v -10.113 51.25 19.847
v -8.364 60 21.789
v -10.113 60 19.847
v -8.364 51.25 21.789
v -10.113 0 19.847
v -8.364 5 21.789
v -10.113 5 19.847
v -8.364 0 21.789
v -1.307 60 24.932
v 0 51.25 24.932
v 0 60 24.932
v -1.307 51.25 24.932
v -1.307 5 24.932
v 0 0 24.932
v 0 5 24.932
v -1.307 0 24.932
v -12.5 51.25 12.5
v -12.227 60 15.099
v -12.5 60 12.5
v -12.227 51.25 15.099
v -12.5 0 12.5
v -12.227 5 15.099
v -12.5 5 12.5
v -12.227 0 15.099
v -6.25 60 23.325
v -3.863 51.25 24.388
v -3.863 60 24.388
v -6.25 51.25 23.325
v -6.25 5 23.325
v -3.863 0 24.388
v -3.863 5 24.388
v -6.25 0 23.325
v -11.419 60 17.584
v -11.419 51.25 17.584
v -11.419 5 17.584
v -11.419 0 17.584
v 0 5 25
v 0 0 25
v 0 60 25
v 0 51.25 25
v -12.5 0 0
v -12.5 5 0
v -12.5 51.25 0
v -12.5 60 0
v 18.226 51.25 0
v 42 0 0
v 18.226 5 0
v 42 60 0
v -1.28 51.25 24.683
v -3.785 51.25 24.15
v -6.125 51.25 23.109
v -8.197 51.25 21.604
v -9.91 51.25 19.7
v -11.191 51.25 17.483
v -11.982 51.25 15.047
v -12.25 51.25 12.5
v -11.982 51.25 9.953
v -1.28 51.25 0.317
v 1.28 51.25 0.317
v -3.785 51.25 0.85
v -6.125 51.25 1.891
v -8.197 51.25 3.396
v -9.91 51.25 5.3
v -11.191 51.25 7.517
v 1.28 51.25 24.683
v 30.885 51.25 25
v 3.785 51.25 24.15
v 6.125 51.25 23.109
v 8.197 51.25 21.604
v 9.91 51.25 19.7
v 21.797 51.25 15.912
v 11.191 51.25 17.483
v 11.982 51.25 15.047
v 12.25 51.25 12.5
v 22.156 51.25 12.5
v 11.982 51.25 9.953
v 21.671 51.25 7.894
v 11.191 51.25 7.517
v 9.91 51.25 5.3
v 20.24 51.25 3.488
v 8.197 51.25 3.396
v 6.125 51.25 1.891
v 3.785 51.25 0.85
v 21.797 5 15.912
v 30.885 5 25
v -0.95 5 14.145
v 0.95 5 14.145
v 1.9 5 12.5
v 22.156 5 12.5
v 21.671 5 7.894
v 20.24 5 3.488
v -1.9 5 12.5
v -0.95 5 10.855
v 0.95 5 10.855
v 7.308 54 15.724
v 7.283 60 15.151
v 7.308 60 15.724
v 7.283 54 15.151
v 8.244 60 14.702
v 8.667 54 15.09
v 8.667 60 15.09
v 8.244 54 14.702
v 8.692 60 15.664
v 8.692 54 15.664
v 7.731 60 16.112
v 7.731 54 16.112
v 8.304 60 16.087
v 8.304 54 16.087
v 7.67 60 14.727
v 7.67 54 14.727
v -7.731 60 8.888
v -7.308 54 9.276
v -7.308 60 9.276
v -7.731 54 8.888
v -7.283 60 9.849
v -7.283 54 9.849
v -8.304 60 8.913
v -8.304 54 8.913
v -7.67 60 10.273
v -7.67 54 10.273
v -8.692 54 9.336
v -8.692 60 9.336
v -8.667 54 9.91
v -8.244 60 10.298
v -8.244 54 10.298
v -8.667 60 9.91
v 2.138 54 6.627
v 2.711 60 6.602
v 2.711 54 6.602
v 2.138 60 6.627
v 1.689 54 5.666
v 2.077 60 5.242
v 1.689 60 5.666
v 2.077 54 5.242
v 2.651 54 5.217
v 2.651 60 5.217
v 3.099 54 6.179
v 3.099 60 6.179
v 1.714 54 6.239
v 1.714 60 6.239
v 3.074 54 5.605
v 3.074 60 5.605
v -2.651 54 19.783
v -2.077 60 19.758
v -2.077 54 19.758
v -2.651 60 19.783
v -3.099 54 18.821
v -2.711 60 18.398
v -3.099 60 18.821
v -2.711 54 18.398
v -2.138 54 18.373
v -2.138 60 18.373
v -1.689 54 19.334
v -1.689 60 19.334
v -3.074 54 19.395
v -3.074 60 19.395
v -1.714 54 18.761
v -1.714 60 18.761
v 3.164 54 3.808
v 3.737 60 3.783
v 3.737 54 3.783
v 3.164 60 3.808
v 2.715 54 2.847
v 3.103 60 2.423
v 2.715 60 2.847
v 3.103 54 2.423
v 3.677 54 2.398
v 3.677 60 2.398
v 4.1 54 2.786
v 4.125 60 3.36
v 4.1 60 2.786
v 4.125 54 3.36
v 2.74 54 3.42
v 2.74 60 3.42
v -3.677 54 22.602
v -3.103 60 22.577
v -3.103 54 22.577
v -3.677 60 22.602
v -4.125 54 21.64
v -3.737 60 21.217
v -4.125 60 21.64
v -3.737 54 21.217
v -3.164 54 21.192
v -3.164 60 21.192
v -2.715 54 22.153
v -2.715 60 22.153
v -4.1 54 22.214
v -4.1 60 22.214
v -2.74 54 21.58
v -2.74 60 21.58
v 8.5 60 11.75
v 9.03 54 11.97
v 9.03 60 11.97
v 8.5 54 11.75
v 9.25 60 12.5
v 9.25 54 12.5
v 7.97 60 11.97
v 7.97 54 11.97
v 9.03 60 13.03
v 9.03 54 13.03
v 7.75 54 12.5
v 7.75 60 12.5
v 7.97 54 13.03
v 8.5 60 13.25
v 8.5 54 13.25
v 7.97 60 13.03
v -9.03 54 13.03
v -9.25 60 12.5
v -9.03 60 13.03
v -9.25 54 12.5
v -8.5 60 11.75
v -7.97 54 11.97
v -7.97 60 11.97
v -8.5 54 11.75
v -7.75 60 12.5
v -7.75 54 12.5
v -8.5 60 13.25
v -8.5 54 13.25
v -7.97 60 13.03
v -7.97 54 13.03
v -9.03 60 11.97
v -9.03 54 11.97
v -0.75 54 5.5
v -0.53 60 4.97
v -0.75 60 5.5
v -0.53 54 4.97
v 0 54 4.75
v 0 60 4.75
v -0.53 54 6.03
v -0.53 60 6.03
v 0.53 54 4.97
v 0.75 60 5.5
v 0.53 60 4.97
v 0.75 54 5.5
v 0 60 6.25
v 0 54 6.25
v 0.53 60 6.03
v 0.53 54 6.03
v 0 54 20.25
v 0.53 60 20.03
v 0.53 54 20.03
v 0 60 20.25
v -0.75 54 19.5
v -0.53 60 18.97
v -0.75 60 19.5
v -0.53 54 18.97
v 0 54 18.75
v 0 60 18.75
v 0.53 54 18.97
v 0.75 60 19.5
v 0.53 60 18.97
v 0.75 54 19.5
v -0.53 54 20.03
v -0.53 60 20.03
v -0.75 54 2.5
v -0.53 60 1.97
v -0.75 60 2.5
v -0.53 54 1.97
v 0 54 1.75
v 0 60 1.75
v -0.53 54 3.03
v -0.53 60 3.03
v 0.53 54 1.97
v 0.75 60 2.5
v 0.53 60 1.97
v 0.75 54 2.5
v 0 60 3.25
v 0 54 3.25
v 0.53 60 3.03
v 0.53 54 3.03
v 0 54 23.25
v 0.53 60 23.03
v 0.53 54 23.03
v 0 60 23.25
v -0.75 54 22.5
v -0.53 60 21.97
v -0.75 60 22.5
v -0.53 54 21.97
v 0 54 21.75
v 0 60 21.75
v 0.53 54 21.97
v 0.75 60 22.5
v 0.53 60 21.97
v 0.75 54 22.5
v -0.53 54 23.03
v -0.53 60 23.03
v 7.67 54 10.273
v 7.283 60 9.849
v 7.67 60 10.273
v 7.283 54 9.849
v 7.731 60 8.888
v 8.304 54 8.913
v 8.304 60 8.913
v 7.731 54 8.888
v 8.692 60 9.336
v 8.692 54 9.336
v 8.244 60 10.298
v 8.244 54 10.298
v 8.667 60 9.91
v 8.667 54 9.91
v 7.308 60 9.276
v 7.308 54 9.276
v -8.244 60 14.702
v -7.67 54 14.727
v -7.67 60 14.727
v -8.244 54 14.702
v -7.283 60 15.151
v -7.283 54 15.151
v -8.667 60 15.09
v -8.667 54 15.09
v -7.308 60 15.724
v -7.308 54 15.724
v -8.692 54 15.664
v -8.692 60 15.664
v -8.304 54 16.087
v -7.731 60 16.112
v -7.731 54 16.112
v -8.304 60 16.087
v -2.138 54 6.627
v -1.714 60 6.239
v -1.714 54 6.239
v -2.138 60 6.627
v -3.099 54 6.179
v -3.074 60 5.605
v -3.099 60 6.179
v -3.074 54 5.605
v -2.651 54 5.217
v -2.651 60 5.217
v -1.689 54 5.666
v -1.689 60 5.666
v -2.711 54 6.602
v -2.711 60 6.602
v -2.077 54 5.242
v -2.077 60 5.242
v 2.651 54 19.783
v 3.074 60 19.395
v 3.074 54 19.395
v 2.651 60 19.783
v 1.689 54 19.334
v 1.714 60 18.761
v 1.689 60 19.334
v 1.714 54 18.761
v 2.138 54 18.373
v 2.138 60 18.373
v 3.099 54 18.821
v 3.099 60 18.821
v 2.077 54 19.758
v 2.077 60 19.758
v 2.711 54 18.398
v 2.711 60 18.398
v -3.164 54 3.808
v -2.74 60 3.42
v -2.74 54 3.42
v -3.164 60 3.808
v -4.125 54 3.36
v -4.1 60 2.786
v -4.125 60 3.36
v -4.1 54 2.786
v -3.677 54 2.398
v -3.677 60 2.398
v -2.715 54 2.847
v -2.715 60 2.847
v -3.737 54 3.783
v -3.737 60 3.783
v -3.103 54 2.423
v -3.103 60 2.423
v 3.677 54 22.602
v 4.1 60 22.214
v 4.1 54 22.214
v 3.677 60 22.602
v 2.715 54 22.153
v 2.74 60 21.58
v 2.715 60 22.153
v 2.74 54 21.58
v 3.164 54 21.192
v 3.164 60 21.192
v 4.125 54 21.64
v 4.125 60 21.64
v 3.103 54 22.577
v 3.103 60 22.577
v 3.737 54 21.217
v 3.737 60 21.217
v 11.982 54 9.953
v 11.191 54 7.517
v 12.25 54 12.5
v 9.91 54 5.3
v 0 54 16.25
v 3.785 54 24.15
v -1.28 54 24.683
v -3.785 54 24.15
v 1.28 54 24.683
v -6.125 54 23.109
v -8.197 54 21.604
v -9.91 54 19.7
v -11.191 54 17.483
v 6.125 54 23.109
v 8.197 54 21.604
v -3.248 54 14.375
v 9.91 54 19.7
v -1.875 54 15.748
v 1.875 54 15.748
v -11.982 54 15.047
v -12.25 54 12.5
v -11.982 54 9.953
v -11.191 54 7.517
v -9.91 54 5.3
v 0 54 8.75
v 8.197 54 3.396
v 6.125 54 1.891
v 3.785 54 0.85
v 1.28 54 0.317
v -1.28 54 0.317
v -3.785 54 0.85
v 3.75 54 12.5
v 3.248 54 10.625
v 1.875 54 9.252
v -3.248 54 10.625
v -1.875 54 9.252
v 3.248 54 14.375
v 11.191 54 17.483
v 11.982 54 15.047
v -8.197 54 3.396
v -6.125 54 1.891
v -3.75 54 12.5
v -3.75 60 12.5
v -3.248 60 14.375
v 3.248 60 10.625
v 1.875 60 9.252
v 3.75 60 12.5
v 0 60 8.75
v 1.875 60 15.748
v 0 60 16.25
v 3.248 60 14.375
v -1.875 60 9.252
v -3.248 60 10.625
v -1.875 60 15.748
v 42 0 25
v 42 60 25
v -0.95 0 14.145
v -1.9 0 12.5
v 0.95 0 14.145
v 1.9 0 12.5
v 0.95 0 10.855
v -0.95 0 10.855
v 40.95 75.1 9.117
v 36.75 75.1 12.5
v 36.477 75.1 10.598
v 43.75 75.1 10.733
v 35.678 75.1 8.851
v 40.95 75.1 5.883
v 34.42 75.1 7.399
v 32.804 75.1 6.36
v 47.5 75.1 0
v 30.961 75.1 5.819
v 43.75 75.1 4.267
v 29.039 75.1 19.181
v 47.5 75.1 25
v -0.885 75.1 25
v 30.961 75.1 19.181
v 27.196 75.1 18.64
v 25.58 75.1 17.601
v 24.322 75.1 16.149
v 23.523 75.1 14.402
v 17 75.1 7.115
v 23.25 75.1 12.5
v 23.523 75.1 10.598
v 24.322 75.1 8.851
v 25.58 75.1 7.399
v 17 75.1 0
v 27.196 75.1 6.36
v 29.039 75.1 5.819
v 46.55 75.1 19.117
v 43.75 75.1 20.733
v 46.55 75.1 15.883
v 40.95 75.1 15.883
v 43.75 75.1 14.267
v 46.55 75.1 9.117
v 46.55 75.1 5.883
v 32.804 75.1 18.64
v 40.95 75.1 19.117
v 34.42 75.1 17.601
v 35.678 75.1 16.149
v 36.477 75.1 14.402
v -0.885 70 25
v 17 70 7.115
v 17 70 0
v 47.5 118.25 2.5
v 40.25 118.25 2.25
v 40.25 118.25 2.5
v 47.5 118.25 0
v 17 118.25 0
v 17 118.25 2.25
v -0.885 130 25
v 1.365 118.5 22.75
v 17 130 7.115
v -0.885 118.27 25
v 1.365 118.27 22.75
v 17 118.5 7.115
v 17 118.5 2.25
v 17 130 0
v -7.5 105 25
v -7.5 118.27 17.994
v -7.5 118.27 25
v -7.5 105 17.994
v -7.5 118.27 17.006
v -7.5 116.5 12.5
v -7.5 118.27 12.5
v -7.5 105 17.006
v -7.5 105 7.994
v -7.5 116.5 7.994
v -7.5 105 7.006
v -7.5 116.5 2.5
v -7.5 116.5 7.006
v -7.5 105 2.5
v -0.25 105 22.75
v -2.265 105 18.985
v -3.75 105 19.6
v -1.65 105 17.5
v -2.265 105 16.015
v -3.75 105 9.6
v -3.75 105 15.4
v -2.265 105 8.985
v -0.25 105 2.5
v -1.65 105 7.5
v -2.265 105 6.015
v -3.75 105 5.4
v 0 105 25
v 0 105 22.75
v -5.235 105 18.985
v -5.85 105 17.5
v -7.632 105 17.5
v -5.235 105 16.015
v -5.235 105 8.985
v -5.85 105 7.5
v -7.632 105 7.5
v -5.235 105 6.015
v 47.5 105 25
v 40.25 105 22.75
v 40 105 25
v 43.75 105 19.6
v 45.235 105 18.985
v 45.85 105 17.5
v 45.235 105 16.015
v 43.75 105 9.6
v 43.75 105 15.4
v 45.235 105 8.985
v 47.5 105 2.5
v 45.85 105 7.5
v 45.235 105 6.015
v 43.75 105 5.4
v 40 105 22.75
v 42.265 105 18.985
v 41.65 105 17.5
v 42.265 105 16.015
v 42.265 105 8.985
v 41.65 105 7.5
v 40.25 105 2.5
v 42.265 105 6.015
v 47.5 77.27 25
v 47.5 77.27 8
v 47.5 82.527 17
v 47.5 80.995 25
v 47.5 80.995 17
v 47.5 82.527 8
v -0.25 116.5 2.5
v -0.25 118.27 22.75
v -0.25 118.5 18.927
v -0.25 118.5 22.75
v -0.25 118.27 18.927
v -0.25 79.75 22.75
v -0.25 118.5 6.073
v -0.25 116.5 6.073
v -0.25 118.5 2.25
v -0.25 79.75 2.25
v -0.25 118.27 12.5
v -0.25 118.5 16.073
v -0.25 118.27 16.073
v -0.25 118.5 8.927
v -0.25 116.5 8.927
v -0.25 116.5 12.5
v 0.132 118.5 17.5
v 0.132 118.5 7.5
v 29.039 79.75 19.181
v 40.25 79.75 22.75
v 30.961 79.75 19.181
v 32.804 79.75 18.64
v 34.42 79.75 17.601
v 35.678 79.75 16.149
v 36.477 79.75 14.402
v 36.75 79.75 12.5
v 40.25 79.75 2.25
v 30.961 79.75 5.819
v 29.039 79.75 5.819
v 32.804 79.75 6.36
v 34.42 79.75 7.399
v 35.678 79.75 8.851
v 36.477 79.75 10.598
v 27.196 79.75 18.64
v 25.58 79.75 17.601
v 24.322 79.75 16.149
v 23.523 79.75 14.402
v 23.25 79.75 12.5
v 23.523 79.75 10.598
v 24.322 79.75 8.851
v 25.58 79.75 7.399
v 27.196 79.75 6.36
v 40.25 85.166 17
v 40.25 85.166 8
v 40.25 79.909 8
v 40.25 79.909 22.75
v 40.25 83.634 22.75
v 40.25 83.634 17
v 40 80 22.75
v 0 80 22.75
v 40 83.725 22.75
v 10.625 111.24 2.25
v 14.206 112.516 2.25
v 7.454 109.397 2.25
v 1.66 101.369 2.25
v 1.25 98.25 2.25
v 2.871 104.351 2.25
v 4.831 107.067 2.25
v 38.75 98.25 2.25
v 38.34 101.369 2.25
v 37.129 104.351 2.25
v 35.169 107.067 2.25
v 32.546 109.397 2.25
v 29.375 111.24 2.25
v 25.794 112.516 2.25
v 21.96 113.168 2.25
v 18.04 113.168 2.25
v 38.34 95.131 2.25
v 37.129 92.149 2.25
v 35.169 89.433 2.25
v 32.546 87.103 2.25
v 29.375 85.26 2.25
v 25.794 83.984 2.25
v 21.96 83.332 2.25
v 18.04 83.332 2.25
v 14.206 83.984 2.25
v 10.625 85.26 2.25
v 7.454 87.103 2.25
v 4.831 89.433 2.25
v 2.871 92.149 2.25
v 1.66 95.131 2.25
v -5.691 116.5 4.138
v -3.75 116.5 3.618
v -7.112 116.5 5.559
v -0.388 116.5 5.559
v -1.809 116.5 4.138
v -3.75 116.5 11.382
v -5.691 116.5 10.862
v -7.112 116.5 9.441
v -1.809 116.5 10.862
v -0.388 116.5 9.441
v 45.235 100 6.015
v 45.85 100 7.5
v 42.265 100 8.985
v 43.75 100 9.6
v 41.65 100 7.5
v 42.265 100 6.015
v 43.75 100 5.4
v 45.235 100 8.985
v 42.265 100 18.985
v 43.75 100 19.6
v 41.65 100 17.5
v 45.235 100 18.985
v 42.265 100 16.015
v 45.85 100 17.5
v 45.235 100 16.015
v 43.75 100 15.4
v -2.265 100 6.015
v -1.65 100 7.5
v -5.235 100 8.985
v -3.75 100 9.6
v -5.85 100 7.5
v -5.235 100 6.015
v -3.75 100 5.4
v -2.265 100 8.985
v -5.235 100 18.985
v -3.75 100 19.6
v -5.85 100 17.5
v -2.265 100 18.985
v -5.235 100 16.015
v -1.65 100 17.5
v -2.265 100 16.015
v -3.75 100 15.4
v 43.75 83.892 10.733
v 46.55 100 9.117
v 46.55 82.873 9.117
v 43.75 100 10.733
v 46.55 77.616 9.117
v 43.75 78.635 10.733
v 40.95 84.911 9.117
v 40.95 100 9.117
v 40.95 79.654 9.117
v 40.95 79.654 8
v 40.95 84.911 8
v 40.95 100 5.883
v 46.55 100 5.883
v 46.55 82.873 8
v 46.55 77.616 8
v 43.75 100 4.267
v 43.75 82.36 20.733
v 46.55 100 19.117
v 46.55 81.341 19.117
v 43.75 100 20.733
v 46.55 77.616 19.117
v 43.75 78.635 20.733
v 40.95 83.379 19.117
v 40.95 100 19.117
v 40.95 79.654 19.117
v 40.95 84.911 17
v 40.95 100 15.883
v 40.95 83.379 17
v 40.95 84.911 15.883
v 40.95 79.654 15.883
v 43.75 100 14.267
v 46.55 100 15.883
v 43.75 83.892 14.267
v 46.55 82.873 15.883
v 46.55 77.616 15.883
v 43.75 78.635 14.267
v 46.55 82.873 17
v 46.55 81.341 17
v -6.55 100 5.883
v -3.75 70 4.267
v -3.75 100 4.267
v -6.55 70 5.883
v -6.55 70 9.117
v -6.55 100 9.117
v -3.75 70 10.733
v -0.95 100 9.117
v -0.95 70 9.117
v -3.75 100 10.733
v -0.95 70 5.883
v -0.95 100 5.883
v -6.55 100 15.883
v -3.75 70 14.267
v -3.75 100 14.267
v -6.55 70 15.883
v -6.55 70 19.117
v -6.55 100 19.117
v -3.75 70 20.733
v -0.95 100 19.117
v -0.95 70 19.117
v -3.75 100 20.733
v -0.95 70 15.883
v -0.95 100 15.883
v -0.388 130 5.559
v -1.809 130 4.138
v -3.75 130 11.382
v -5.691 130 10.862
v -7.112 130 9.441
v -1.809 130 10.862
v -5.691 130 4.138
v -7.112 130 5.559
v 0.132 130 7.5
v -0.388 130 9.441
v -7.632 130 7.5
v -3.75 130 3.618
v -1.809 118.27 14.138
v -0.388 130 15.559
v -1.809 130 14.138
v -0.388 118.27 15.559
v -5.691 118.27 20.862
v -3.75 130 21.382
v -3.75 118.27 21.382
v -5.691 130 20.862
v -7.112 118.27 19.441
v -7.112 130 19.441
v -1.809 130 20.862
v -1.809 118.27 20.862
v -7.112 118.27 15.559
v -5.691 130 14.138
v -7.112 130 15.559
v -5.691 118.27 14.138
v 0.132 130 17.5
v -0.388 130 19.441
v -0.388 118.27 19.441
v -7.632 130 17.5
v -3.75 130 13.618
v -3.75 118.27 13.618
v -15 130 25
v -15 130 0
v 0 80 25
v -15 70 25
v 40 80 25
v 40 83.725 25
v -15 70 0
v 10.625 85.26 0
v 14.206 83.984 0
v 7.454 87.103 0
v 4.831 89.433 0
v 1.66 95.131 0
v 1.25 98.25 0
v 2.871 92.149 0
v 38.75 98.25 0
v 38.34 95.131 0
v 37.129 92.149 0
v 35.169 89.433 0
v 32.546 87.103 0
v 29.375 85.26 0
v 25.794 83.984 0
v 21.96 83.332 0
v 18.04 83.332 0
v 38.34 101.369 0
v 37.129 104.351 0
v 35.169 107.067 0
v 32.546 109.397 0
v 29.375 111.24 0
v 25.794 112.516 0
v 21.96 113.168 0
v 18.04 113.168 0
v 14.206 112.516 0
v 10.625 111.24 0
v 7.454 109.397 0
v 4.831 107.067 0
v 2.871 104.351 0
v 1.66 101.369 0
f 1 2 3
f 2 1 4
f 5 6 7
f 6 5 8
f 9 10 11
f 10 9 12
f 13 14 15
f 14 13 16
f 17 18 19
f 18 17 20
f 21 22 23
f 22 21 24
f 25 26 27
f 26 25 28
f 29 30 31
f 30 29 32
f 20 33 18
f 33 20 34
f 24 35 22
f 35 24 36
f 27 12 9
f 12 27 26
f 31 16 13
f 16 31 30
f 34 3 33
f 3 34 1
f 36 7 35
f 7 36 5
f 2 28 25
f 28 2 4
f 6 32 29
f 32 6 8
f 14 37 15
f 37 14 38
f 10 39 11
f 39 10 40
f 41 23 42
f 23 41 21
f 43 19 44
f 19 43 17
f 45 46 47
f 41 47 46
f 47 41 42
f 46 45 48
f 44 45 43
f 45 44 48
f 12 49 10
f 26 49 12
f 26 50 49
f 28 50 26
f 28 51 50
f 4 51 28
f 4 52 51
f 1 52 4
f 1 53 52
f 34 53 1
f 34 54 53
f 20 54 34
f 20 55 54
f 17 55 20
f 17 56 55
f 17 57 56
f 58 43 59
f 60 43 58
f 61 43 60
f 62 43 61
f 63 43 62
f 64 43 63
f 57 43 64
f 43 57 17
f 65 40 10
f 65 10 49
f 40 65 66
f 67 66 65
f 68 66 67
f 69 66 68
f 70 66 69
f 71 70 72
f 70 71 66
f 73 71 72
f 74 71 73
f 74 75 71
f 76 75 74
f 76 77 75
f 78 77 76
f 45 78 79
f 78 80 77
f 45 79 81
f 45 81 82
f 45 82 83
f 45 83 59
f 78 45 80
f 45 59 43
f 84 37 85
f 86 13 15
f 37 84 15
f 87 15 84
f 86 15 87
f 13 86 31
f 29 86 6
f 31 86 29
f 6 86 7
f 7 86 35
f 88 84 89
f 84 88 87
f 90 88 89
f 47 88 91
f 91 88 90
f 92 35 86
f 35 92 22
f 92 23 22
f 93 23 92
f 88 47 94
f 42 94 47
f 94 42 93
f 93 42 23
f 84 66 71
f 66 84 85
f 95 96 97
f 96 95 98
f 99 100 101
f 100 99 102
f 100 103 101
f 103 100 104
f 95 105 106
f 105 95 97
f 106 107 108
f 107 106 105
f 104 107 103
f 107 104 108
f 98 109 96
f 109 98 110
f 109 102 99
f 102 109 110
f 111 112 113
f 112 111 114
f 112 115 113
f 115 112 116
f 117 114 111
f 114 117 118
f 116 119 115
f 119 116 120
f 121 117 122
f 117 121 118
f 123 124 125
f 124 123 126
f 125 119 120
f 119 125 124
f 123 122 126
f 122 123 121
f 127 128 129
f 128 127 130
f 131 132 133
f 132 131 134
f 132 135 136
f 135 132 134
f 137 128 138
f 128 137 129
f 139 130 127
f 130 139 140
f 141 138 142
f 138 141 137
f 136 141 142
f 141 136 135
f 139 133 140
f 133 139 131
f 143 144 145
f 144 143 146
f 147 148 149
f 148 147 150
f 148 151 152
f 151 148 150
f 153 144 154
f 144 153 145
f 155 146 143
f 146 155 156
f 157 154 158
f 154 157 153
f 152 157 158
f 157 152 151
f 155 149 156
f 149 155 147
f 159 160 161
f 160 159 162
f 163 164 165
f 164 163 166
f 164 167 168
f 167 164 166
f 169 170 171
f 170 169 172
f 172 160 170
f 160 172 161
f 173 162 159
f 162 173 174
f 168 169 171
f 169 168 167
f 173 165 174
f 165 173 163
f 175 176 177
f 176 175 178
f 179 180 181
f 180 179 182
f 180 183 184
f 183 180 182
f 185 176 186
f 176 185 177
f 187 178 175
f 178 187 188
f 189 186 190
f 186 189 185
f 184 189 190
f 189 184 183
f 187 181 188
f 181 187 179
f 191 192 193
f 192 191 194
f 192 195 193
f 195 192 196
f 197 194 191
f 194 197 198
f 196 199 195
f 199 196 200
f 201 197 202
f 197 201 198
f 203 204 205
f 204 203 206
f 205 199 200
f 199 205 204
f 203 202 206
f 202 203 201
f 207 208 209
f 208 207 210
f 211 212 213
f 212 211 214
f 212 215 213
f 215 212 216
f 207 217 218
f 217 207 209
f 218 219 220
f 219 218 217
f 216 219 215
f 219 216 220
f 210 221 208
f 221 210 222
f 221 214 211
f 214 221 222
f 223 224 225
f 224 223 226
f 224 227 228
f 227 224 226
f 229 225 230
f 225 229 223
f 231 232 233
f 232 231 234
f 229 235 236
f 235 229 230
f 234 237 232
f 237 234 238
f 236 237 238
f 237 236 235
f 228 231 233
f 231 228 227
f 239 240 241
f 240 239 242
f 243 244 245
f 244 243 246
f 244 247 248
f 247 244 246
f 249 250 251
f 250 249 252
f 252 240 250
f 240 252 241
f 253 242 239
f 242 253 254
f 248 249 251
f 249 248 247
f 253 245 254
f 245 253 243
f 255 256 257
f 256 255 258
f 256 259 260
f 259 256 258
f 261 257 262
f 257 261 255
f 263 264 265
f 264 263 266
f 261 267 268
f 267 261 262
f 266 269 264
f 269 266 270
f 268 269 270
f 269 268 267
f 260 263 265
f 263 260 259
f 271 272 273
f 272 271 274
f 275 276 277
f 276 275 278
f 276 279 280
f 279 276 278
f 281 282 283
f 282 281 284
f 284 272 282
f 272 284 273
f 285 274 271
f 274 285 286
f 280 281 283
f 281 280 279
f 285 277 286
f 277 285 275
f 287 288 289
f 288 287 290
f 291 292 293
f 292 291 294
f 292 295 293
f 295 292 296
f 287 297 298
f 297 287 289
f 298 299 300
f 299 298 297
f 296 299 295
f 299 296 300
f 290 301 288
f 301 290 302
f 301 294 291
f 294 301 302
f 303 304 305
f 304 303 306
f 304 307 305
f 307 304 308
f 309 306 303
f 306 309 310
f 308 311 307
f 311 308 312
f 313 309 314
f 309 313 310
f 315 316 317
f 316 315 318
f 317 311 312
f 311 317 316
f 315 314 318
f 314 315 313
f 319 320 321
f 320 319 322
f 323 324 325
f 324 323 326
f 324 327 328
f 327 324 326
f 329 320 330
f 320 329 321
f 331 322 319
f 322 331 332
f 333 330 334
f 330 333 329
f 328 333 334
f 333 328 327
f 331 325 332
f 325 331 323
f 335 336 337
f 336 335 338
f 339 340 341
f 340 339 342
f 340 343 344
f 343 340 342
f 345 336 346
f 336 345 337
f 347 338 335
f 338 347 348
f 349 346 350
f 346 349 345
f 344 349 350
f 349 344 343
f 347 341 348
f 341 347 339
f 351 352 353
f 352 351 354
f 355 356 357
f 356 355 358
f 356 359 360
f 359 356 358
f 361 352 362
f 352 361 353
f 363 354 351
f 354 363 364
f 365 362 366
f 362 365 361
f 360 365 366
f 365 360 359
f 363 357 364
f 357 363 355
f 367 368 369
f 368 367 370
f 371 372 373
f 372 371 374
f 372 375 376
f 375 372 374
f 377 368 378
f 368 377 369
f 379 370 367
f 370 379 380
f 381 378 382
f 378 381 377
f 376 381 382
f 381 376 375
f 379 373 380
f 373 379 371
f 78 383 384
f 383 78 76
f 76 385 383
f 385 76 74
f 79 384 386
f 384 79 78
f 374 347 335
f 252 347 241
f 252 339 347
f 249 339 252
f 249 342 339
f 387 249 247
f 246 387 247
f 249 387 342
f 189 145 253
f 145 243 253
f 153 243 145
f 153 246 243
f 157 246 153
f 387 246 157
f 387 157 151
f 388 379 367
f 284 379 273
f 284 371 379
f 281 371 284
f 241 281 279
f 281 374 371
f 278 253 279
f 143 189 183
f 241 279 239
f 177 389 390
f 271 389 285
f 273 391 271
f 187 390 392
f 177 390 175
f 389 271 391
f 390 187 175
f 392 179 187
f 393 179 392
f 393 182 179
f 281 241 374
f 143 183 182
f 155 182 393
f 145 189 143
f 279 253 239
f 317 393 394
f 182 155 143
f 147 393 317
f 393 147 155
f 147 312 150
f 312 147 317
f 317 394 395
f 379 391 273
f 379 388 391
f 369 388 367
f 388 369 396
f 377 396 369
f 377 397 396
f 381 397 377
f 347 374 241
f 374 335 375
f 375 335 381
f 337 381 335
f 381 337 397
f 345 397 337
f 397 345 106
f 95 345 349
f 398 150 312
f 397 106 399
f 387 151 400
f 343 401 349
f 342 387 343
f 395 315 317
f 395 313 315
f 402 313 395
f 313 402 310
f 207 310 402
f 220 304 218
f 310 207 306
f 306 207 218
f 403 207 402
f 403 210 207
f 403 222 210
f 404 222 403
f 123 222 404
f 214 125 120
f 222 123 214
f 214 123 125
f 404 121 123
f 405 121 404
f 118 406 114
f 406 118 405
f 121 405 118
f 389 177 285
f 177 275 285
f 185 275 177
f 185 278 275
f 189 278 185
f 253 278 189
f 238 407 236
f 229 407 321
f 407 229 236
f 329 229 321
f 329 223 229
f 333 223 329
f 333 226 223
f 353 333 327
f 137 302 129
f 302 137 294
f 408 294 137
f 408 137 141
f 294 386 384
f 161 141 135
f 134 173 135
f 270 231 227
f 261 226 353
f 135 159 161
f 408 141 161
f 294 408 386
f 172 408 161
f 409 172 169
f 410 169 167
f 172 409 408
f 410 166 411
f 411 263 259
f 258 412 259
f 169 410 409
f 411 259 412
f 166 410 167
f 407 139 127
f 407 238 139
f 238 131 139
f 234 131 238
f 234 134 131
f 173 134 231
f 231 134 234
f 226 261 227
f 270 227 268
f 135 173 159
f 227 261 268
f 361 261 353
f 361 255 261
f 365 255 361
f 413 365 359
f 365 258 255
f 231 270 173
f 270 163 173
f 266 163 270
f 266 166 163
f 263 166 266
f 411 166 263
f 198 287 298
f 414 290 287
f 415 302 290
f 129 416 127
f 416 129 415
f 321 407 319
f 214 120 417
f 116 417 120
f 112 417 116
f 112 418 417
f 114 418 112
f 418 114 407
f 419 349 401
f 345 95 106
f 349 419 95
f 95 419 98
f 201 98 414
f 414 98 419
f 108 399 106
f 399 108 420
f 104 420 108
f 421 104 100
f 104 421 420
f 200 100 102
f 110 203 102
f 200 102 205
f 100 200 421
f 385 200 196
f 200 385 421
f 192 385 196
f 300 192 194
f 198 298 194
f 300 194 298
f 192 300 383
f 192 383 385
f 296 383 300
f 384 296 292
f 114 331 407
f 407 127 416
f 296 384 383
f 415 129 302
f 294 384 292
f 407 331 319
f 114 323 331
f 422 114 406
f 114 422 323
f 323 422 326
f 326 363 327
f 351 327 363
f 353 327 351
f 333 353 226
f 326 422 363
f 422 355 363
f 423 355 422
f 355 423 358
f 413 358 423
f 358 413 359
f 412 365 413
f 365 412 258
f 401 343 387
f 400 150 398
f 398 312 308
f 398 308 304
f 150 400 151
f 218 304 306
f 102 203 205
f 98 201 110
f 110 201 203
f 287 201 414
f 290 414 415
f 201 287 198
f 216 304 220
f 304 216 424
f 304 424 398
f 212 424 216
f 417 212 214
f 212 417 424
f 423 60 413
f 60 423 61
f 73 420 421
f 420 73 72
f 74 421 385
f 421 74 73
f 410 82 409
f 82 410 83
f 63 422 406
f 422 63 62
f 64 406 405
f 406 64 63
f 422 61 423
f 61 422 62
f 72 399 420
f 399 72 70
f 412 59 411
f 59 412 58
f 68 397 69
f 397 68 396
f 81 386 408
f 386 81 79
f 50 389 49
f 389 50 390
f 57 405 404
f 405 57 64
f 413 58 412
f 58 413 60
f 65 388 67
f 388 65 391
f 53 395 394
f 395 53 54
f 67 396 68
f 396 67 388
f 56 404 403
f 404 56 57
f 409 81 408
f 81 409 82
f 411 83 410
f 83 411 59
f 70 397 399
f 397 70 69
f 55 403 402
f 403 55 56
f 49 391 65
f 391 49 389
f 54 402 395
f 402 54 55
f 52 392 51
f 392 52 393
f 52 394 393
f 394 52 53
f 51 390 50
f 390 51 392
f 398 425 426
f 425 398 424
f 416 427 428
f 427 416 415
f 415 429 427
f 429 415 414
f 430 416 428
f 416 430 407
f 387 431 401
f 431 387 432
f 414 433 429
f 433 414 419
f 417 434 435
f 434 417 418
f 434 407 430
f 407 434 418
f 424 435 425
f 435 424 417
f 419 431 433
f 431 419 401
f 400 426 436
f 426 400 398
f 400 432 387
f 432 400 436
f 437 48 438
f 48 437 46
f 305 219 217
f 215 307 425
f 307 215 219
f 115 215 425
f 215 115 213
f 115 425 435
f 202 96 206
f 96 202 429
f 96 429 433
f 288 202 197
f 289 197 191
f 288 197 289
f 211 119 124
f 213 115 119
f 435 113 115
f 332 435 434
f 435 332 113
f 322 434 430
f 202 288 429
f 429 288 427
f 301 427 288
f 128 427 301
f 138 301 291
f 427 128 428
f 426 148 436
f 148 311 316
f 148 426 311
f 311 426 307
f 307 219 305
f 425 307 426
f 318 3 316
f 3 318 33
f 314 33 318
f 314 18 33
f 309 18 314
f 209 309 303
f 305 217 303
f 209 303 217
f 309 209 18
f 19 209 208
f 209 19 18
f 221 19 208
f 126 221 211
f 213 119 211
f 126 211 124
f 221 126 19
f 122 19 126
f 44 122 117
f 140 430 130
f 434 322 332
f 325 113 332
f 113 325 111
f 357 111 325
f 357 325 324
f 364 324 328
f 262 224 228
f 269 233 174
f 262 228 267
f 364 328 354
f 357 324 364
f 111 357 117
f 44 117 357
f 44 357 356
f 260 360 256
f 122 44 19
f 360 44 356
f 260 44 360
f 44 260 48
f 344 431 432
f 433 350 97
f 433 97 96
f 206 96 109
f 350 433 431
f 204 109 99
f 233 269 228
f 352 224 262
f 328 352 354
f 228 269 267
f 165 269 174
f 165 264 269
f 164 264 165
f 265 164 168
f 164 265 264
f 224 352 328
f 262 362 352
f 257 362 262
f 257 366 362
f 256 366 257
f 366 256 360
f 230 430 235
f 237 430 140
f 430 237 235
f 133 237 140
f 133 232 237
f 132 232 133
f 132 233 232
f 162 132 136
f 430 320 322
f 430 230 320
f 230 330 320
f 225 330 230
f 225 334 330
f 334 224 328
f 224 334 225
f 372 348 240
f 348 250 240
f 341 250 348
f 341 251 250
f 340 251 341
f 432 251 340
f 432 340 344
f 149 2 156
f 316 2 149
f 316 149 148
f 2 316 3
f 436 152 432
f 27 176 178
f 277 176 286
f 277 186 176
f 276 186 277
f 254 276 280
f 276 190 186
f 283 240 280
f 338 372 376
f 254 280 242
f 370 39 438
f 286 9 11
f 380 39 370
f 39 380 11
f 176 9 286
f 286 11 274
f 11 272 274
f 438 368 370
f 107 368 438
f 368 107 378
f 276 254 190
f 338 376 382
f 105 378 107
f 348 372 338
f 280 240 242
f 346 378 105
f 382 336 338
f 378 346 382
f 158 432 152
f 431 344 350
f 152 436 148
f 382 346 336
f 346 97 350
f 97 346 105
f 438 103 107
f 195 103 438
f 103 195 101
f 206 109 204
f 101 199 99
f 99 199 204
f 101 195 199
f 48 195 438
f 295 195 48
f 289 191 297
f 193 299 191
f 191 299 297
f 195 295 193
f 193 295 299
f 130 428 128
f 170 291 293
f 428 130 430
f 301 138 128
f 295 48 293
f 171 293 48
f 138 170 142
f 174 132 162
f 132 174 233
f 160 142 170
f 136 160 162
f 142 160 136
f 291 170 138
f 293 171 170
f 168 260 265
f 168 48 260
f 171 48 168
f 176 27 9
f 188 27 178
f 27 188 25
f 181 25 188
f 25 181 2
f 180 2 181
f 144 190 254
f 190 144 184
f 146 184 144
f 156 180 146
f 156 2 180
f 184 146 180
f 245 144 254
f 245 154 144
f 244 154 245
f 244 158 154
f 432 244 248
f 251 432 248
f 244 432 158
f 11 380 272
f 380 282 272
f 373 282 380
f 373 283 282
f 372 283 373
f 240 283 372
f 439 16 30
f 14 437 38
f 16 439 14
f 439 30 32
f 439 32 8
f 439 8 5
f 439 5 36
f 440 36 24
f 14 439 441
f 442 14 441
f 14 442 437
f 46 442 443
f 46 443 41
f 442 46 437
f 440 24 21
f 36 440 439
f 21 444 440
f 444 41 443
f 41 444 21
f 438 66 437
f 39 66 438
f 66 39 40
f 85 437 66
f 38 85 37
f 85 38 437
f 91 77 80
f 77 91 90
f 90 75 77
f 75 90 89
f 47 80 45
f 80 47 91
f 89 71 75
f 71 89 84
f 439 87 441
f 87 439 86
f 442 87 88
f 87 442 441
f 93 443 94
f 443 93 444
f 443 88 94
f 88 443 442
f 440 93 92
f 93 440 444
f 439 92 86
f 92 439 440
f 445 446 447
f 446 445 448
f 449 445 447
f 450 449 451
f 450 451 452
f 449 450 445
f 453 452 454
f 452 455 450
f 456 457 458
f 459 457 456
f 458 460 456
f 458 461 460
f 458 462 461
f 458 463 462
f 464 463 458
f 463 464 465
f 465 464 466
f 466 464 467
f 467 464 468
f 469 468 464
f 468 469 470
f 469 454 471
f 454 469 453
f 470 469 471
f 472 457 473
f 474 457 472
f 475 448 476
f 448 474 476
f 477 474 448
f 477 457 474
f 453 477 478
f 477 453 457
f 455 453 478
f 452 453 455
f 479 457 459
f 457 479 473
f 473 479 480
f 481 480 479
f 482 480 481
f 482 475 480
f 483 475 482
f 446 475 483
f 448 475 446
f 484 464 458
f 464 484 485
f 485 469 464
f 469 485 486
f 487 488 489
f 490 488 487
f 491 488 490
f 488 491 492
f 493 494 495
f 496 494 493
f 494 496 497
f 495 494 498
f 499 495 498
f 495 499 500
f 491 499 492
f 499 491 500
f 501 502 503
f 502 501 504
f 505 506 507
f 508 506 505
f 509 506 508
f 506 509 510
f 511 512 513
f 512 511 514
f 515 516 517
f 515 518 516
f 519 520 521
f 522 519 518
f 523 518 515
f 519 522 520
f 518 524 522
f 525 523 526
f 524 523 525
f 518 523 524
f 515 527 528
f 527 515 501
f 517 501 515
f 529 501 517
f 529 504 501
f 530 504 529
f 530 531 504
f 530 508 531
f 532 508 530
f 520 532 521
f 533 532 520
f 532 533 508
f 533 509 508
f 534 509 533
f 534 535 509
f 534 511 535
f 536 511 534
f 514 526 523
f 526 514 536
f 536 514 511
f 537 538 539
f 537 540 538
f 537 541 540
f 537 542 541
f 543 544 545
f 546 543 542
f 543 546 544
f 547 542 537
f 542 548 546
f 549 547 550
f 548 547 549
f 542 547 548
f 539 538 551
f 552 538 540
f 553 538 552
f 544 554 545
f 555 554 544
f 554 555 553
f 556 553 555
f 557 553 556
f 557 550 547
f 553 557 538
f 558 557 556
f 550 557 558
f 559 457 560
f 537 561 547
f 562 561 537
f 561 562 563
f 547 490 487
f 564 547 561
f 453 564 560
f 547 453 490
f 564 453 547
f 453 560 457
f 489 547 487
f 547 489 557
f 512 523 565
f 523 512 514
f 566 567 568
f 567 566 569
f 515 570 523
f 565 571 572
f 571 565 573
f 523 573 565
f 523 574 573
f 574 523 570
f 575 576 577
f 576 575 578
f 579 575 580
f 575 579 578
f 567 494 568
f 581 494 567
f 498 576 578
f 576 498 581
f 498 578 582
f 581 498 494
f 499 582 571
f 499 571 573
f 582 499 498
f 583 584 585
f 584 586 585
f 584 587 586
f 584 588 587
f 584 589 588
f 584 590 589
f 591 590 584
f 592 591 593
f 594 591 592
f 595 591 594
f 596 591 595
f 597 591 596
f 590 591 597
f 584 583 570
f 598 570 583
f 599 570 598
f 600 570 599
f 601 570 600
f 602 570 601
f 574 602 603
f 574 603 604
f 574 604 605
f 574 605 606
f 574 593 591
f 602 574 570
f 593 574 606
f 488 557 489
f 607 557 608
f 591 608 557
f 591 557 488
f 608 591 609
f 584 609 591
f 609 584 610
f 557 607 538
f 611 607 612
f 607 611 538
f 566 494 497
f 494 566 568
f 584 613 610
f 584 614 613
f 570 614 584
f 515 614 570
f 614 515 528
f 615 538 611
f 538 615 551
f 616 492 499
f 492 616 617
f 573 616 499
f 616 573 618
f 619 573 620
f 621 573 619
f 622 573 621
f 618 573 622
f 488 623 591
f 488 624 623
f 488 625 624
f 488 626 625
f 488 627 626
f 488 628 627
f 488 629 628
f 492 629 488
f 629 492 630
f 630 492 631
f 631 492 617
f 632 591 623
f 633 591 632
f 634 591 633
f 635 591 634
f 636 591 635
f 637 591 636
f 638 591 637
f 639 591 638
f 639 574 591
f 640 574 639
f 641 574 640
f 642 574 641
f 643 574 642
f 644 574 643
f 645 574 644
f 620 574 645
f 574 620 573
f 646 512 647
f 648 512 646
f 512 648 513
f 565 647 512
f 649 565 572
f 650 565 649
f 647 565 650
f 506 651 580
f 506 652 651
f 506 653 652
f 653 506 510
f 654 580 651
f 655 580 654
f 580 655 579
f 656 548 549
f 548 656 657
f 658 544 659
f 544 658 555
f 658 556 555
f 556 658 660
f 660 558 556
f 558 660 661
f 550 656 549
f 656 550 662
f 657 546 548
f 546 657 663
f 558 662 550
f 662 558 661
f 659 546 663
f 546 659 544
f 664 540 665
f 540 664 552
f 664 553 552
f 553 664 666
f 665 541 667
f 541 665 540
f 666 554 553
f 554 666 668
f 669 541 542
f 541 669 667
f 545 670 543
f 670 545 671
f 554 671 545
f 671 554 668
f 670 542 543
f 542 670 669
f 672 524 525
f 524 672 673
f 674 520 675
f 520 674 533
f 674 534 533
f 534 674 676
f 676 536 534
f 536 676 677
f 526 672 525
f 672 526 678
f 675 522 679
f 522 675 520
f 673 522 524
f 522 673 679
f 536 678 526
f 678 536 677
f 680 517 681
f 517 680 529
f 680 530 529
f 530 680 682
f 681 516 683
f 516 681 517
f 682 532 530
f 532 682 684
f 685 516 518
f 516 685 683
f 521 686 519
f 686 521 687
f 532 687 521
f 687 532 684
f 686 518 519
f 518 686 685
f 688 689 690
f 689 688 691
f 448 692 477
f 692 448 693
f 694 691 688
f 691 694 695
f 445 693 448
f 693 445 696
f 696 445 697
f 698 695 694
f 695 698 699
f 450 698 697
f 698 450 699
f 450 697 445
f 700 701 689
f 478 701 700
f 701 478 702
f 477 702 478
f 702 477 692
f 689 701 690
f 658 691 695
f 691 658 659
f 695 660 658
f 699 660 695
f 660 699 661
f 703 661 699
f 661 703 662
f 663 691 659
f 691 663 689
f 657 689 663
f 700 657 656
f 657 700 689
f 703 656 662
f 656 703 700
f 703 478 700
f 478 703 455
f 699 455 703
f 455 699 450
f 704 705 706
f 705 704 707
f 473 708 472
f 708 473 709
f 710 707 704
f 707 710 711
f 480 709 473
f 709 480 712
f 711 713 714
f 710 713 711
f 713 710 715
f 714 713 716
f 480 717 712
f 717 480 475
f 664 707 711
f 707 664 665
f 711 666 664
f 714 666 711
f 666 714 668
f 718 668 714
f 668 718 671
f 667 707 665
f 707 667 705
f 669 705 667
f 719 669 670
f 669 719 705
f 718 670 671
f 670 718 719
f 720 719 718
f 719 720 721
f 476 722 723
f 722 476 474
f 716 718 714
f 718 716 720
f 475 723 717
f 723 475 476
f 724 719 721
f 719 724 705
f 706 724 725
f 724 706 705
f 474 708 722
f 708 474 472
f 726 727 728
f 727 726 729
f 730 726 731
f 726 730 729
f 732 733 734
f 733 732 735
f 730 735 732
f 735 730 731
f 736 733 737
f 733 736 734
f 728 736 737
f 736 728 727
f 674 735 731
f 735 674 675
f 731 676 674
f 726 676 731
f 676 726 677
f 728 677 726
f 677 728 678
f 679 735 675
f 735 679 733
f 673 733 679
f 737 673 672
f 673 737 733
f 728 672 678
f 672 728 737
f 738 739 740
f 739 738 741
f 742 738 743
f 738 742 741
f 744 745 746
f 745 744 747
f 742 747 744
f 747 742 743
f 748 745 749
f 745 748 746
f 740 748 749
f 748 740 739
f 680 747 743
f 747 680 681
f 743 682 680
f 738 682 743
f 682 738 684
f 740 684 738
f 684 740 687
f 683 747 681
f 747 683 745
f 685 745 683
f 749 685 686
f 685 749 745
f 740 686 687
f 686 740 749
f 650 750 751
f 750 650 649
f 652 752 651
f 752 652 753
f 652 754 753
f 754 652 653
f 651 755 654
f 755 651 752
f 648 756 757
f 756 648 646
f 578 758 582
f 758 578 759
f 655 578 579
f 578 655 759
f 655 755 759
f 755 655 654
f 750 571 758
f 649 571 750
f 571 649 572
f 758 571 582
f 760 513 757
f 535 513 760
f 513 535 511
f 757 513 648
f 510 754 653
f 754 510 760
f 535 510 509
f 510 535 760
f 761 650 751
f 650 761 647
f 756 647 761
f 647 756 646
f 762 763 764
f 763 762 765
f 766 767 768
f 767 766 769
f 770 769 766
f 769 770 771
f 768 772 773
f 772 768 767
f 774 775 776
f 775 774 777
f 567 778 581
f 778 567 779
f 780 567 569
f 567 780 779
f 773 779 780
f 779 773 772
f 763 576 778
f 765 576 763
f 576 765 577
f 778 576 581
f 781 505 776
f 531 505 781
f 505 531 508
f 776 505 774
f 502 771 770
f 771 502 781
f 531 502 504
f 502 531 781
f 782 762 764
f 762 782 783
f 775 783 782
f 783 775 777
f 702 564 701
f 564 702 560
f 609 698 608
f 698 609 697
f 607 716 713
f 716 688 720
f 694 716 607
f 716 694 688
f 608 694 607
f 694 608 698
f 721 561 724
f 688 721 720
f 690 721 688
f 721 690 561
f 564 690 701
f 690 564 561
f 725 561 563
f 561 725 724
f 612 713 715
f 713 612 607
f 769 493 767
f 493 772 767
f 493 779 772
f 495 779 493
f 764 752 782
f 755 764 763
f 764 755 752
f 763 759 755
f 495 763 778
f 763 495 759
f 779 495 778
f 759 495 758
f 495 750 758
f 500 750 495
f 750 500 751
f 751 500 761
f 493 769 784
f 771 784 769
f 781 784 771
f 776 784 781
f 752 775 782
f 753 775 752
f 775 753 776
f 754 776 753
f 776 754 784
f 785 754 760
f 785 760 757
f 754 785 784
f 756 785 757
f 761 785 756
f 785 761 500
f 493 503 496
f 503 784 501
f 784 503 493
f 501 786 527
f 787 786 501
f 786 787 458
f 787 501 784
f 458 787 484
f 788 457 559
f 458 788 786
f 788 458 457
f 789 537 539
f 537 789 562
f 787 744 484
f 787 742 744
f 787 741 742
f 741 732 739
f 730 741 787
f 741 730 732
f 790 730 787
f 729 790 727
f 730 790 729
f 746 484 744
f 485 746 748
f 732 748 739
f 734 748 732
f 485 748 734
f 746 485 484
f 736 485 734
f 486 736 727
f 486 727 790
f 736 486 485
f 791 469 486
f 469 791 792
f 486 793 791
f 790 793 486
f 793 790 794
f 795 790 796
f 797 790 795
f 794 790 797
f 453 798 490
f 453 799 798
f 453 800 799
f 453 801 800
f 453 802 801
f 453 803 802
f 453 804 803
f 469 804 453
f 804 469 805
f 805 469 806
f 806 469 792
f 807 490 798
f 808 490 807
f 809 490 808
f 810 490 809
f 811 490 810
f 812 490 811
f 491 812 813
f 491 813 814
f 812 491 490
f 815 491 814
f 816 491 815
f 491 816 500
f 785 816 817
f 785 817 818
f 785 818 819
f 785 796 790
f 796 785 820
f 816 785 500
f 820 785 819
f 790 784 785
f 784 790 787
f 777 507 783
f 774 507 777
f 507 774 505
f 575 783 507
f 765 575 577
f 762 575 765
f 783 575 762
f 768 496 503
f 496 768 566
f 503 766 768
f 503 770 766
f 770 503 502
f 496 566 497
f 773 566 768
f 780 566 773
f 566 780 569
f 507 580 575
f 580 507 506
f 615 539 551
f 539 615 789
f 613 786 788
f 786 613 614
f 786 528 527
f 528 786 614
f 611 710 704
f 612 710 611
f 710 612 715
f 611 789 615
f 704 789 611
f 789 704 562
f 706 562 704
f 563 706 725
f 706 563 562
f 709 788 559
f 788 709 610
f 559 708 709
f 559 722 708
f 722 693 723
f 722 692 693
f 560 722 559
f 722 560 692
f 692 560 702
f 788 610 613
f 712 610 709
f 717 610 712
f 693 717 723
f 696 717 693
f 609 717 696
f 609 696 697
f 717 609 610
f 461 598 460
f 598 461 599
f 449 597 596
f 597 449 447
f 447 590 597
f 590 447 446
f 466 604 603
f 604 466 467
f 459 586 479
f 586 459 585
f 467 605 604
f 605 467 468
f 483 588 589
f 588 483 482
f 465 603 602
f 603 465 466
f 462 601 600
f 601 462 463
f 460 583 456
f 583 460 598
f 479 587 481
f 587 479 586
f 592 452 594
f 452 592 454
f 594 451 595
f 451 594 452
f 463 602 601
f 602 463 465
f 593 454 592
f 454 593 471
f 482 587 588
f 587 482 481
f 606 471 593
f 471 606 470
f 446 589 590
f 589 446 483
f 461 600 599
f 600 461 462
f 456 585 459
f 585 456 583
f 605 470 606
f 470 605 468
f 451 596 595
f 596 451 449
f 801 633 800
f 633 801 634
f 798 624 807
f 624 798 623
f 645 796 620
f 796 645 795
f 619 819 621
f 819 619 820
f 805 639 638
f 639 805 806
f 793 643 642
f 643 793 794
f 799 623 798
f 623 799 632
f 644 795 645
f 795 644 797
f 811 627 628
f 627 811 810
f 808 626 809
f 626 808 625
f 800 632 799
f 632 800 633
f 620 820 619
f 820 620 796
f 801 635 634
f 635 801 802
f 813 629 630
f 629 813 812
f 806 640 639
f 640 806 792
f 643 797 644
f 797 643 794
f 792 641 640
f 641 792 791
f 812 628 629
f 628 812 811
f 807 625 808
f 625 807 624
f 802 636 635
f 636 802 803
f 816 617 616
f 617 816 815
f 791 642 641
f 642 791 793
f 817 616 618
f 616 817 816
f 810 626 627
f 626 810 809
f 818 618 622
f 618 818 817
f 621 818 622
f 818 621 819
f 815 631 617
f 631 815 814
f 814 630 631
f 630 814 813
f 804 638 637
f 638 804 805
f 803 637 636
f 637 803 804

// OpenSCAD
// file: servo.scad
A = 20;
B = 15 - 1.25;
C = 35 - 1.25;
D = 10;
E = 10;
F = 30;
G = 13.25;
H = 25;
I = 6.5; // height of mounting wings
J = 55;
K = 11.5;
L = 4.2;
M = 40;
Q = 44 -  G - H;
X = 3;

echo("H + K = ", H + K);
echo("H + G = ", H + G);
echo("Q = ", Q);

M3_nut_radius = 5.6 / cos(180 / 6) / 2;
M3_washer_radius = 7.5 / 2 / cos(180 / 12);

servo_diag1 = sqrt(pow((J  - M) / 2 + E, 2) + pow(A / 2, 2));
servo_diag2 = sqrt(pow((J  - M) / 2 + F, 2) + pow(A / 2, 2));

negative_clearance = 0.25;

module servo() {
	render() {
		translate([-E, -A / 2, 0]) cube([M, A, H + K]);
		difference() {
			translate([-E - (J - M) / 2, A / -2, H]) cube([J, A, I]);
			translate([-B, -D / 2, H - 1]) cylinder(r=L / 2, h = I +2, $fn=8);
			translate([-B, D / 2, H - 1]) cylinder(r=L / 2, h = I + 2, $fn=8);
			translate([C, -D / 2, H - 1]) cylinder(r=L / 2, h = I + 2, $fn=8);
			translate([C, D / 2, H - 1]) cylinder(r=L / 2, h = I + 2, $fn=8);
		}
		translate([0, 0, H]) cylinder(r = A / 2.5, h=G);
		translate([0, 0, H + K]) cylinder(r = 5 / 2, h=X + (G - K), $fn=16);
	}
}

module servo_negative() {
	render() {
		servo();
		translate([-E - negative_clearance, -A / 2 - negative_clearance, -negative_clearance]) cube([M + negative_clearance * 2, A + negative_clearance * 2, H + G + negative_clearance * 2]);
		translate([0, 0, H]) cylinder(r = A / 2.5 + negative_clearance, h=G + negative_clearance);
	
		translate([-E - (J - M) / 2, A / -2, H]) cube([J, A, K]);
	
		translate([-B, -D / 2, H - 10]) cylinder(r=L / 2, h = 12, $fn=8);
		translate([-B, D / 2, H - 10]) cylinder(r=L / 2, h = 12, $fn=8);
		translate([C, -D / 2, H - 10]) cylinder(r=L / 2, h = 12, $fn=8);
		translate([C, D / 2, H - 10]) cylinder(r=L / 2, h = 12, $fn=8);
		translate([-B, -D / 2, -50]) rotate([0, 0, 180 / 6]) cylinder(r=M3_nut_radius, h = H + 45, $fn=6);
		translate([-B, D / 2, -50]) rotate([0, 0, 180 / 6]) cylinder(r=M3_nut_radius, h = H + 45, $fn=6);
		translate([C, -D / 2, -50]) rotate([0, 0, 180 / 6]) cylinder(r=M3_nut_radius, h = H +45, $fn=6);
		translate([C, D / 2, -50]) rotate([0, 0, 180 / 6]) cylinder(r=M3_nut_radius, h = H + 45, $fn=6);
		translate([-B, -D / 2, H]) rotate([0, 0, 180 / 6]) cylinder(r=M3_washer_radius, h = H + 5, $fn=12);
		translate([-B, D / 2, H]) rotate([0, 0, 180 / 6]) cylinder(r=M3_washer_radius, h = H + 5, $fn=12);
		translate([C, -D / 2, H]) rotate([0, 0, 180 / 6]) cylinder(r=M3_washer_radius, h = H + 5, $fn=12);
		translate([C, D / 2, H]) rotate([0, 0, 180 / 6]) cylinder(r=M3_washer_radius, h = H + 5, $fn=12);
	
		translate([0, 0, H]) rotate([0, 0, 180 / 6]) cylinder(r=M3_nut_radius, h = H + 5, $fn=6);
	
		translate([-E, 0, 1])rotate([0, 20, 180]) translate([-10, -4.5, 0]) cube([100, 9, 4]);
	}
}

module horn_pin() {
	render() {
		cylinder(r=1.5 / 2, h=Q * 5, $fn=8);
		//translate([0, 0, Q + 3]) cylinder(r=1.2, h=Q * 2, $fn=8);
	}
}

module servo_horn() {
	render()
	translate([0, 0, H + G]) difference() {
		cylinder(r = 24 / 2 + negative_clearance, h=Q);
		cylinder(r = 7 / 2 + negative_clearance, h=30);
		for (n=[0:2]) {
			rotate([0, 0, -20 + n * 20]) translate([8.5, 0, 0]) horn_pin();
			rotate([0, 0, -20 + n * 20]) translate([-8.5, 0, 0]) horn_pin();
			rotate([0, 0, 90 -20 + n * 20]) translate([7, 0, 0]) horn_pin();
			rotate([0, 0, 90 -20 + n * 20]) translate([-7, 0, 0]) horn_pin();
			rotate([0, 0, 90 -20 + n * 20]) translate([10, 0, 0]) horn_pin();
			rotate([0, 0, 90 -20 + n * 20]) translate([-10, 0, 0]) horn_pin();
		}
		difference() {
			cylinder(r=50, h=Q - 2);
			cylinder(r=9 / 2, h = Q);
		}
	}
}

module servo_horn_negative() {
	render()
	translate([0, 0, H + G]) {
		cylinder(r = 24 / 2 + negative_clearance, h=Q);
		cylinder(r = 7 / 2 + negative_clearance, h=30);
		for (n=[0:2]) {
			rotate([0, 0, -20 + n * 20]) translate([8.5, 0, 0]) horn_pin();
			rotate([0, 0, -20 + n * 20]) translate([-8.5, 0, 0]) horn_pin();
			rotate([0, 0, 90 -20 + n * 20]) translate([7, 0, 0]) horn_pin();
			rotate([0, 0, 90 -20 + n * 20]) translate([-7, 0, 0]) horn_pin();
			rotate([0, 0, 90 -20 + n * 20]) translate([10, 0, 0]) horn_pin();
			rotate([0, 0, 90 -20 + n * 20]) translate([-10, 0, 0]) horn_pin();
		}
	}
}

//servo();
//%servo_horn_negative();
//%servo_negative();
// main file
include <servo.scad>

// set to 0 for display
print = 1;

min_bend_angle_1 = 135;
min_bend_angle_2 = 0;

angle = -min_bend_angle_2 + (min_bend_angle_1 + min_bend_angle_2) * sin($t * 180);

echo(angle);

module bearing624() {
	difference() {
		cylinder(r=13 / 2, h = 5);
		translate([0, 0, -1]) cylinder(r = 4 / 2, h = 7);
		difference() {
			translate([0, 0, 4.5]) cylinder(r1 = 10 / 2, r2 = 12 / 2, h = 1);
			translate([0, 0, 4.25]) cylinder(r1 = 8 / 2, r2 = 6 / 2, h = 1);
		}
		difference() {
			translate([0, 0, -0.5]) cylinder(r1 = 12 / 2, r2 = 10 / 2, h = 1);
			translate([0, 0, -0.25]) cylinder(r1 = 6 / 2, r2 = 8 / 2, h = 1);
		}
	}
}

module bearing624_negative() {
	cylinder(r=13 / 2 + 0.25, h = 5);
}

module arm1(r = 13, h = 10, l = 100) {
	union() {
		translate([0, -r, 0]) cube([l, r * 2, h]);
		cylinder(r = r, h = h);
		rotate([0, 0, min_bend_angle_1]) translate([-r, -r, 0]) cube([r, r, h]);
	}
}

module arm2(r = 13, h = 10, l = 100) {
	union() {
		translate([0, -r, 0]) cube([l, r * 2, h]);
		cylinder(r = r, h = h);
		rotate([0, 0, -min_bend_angle_2]) translate([-r, 0, 0]) cube([r, r, h]);
	}
}

module shin() {
	difference() {
		translate([-13, -12.5, 0]) cube([J, 25, 60]);
		translate([0, 0, 5]) cylinder(r=servo_diag1 + 2, h=H + G + X + 5);
		translate([0, 0, -1]) cylinder(r = 3.8 / 2, h = 62);
		difference() {
			translate([-25, -15, -1]) cube([25, 30, 100]);
			translate([0, 0, -2]) {
				cylinder(r = 25 / 2, h = 103);
				rotate([0, 0, -min_bend_angle_2]) translate([-25 / 2, 0, 0]) cube([25 / 2, 25 / 2, 100]);
				rotate([0, 0, min_bend_angle_1]) translate([-25 / 2, -25 / 2, 0]) cube([25 / 2, 25 / 2, 100]);
			}
		}
		rotate([0, 0, 180 + min_bend_angle_1]) translate([0, 0, 5]) arm1(26 / 2, H + G + X + 5, 100);
		rotate([0, 0, 180 - min_bend_angle_2]) translate([0, 0, 5]) arm2(26 / 2, H + G + X + 5, 100);
		translate([0, 0, 10]) servo_horn_negative();
	}
}

module thigh() {
	difference() {
		translate([E + (J - M) / 2, 12.5, 0]) rotate([0, 0, 180]) cube([J + (J - M) / 2, 25, 60]);
		rotate([0, 0, -min_bend_angle_1]) translate([0, 0, -1]) arm1(26 / 2, 6.1, 100);
		rotate([0, 0, min_bend_angle_2]) translate([0, 0, -1]) arm2(26 / 2, 6.1, 100);
		translate([0, -15, -1]) cube([26, 30, 6.1]);
		rotate([0, 0, -min_bend_angle_1]) translate([0, 0, 10 + H + G]) arm1(26 / 2, 20, 100);
		rotate([0, 0, min_bend_angle_2]) translate([0, 0, 10 + H + G]) arm2(26 / 2, 20, 100);
		translate([0, -15, 10 + H + G]) cube([25, 30, 20]);
		translate([0, 0, 10]) rotate([0, 0, 180]) servo_negative();
		translate([0, -A / 2, H + 10]) cube([J + 1, A, H +G]);
		translate([-F - (J - M) / 2, -A / 2 - 10, H + 10]) cube([J + 1, A, G + 0.02]);
		translate([-F, -A / 2 - 10, 10]) cube([M, A, H+ 0.02]);
		translate([E, 0, 10]) rotate([0, 20, 0]) translate([-10, -4.5 - 21, 0]) cube([100, 30, 3.5]);
		translate([0, 0, 5]) bearing624_negative();
		translate([-E, 15, 10 + ((H + K) / 2)]) scale([1.25, 1, 1]) rotate([90, 0, 0]) cylinder(r = F / 2, h = 30);
	}
}

if (print == 0) {
	%#translate([0, 0, 10]) rotate([0, 0, 180]) servo();
	%#translate([0, 0, 10]) rotate([0, 0, 180 - angle]) servo_horn();
	%#translate([0, 0, 5]) bearing624();
	
	rotate([0, 0, -angle]) shin();
	thigh();
}
else {
	translate([-50, -10, -1]) %cube([150, 150, 1]);
	translate([0, 0, 12.5]) rotate([-90, 0, 0]) shin();
	translate([30, 70, 12.5]) rotate([-90, 0, 0]) thigh();
}
